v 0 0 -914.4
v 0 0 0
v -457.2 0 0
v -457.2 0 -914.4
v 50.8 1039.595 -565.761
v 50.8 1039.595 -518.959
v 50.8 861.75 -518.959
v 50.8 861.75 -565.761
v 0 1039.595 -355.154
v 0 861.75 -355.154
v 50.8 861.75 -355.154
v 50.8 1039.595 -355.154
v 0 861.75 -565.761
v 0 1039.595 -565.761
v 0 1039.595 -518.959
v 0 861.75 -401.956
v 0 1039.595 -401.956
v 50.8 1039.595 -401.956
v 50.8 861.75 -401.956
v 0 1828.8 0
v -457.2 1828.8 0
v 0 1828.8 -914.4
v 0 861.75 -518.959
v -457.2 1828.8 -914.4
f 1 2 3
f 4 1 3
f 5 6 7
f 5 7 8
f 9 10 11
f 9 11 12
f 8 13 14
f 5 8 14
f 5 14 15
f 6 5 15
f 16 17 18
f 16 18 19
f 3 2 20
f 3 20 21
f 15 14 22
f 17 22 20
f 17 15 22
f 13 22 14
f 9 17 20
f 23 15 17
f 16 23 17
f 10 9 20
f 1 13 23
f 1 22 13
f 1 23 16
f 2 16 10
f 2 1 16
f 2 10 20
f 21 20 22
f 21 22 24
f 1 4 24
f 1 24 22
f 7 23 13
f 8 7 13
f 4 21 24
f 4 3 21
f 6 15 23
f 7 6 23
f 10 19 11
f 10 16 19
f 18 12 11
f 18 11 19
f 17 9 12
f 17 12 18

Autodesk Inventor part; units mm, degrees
ref_plane "YZ Plane" through (0, 0, 0) normal (1, 0, 0) x (0, 1, 0)
ref_plane "XZ Plane" through (0, 0, 0) normal (0, 1, 0) x (-1, 0, 0)
ref_plane "XY Plane" through (0, 0, 0) normal (0, 0, 1) x (1, 0, 0)
sketch "Sketch2" plane through (0, 0, 0) normal (0, 1, 0) x (-1, 0, 0)
  line L0 (0, 0) -> (457.2, 0)
  line L1 (457.2, 0) -> (457.2, -914.4)
  line L2 (457.2, -914.4) -> (0, -914.4)
  line L3 (0, -914.4) -> (0, 0)
  line L4 (457.2, -457.2) -> (0, -457.2)
  dimension "d2" = 457.2
  dimension "d3" = 914.4
extrude "Extrusion2" add sketch "Sketch2" along normal blind 1828.8
sketch "Sketch3" plane through (0, 0, 0) normal (1, 0, 0) x (0, 0, -1)
  line L0 (914.4, 1828.8) -> (0, 1828.8) projected
  line L1 (457.2, 1828.8) -> (457.2, 0)
  line L2 (914.4, 0) -> (0, 0) projected
sketch "Sketch4" plane through (0, 0, 0) normal (1, 0, 0) x (0, 0, -1)
  line L0 (355.1544, 1039.5953) -> (401.9558, 1039.5953)
  line L1 (401.9558, 1039.5953) -> (401.9558, 861.75)
  line L2 (401.9558, 861.75) -> (355.1544, 861.75)
  line L3 (355.1544, 861.75) -> (355.1544, 1039.5953)
  line L4 (518.9593, 861.75) -> (565.7607, 861.75)
  line L5 (565.7607, 861.75) -> (565.7607, 1039.5953)
  line L6 (565.7607, 1039.5953) -> (518.9593, 1039.5953)
  line L7 (518.9593, 1039.5953) -> (518.9593, 861.75)
  point P0 (0, 0)
extrude "Extrusion3" add sketch "Sketch4" along normal blind 50.8
sketch "Sketch5" plane through (0, 0, 0) normal (1, 0, 0) x (0, 0, -1)
  line L0 (34.1958, 1790.2512) -> (883.0565, 1790.2512)
  line L1 (883.0565, 1790.2512) -> (883.0565, 32.1843)
  line L2 (883.0565, 32.1843) -> (34.1958, 32.1843)
  line L3 (34.1958, 32.1843) -> (34.1958, 1790.2512)
  point P0 (0, 0)
properties part number "Cabinet"
